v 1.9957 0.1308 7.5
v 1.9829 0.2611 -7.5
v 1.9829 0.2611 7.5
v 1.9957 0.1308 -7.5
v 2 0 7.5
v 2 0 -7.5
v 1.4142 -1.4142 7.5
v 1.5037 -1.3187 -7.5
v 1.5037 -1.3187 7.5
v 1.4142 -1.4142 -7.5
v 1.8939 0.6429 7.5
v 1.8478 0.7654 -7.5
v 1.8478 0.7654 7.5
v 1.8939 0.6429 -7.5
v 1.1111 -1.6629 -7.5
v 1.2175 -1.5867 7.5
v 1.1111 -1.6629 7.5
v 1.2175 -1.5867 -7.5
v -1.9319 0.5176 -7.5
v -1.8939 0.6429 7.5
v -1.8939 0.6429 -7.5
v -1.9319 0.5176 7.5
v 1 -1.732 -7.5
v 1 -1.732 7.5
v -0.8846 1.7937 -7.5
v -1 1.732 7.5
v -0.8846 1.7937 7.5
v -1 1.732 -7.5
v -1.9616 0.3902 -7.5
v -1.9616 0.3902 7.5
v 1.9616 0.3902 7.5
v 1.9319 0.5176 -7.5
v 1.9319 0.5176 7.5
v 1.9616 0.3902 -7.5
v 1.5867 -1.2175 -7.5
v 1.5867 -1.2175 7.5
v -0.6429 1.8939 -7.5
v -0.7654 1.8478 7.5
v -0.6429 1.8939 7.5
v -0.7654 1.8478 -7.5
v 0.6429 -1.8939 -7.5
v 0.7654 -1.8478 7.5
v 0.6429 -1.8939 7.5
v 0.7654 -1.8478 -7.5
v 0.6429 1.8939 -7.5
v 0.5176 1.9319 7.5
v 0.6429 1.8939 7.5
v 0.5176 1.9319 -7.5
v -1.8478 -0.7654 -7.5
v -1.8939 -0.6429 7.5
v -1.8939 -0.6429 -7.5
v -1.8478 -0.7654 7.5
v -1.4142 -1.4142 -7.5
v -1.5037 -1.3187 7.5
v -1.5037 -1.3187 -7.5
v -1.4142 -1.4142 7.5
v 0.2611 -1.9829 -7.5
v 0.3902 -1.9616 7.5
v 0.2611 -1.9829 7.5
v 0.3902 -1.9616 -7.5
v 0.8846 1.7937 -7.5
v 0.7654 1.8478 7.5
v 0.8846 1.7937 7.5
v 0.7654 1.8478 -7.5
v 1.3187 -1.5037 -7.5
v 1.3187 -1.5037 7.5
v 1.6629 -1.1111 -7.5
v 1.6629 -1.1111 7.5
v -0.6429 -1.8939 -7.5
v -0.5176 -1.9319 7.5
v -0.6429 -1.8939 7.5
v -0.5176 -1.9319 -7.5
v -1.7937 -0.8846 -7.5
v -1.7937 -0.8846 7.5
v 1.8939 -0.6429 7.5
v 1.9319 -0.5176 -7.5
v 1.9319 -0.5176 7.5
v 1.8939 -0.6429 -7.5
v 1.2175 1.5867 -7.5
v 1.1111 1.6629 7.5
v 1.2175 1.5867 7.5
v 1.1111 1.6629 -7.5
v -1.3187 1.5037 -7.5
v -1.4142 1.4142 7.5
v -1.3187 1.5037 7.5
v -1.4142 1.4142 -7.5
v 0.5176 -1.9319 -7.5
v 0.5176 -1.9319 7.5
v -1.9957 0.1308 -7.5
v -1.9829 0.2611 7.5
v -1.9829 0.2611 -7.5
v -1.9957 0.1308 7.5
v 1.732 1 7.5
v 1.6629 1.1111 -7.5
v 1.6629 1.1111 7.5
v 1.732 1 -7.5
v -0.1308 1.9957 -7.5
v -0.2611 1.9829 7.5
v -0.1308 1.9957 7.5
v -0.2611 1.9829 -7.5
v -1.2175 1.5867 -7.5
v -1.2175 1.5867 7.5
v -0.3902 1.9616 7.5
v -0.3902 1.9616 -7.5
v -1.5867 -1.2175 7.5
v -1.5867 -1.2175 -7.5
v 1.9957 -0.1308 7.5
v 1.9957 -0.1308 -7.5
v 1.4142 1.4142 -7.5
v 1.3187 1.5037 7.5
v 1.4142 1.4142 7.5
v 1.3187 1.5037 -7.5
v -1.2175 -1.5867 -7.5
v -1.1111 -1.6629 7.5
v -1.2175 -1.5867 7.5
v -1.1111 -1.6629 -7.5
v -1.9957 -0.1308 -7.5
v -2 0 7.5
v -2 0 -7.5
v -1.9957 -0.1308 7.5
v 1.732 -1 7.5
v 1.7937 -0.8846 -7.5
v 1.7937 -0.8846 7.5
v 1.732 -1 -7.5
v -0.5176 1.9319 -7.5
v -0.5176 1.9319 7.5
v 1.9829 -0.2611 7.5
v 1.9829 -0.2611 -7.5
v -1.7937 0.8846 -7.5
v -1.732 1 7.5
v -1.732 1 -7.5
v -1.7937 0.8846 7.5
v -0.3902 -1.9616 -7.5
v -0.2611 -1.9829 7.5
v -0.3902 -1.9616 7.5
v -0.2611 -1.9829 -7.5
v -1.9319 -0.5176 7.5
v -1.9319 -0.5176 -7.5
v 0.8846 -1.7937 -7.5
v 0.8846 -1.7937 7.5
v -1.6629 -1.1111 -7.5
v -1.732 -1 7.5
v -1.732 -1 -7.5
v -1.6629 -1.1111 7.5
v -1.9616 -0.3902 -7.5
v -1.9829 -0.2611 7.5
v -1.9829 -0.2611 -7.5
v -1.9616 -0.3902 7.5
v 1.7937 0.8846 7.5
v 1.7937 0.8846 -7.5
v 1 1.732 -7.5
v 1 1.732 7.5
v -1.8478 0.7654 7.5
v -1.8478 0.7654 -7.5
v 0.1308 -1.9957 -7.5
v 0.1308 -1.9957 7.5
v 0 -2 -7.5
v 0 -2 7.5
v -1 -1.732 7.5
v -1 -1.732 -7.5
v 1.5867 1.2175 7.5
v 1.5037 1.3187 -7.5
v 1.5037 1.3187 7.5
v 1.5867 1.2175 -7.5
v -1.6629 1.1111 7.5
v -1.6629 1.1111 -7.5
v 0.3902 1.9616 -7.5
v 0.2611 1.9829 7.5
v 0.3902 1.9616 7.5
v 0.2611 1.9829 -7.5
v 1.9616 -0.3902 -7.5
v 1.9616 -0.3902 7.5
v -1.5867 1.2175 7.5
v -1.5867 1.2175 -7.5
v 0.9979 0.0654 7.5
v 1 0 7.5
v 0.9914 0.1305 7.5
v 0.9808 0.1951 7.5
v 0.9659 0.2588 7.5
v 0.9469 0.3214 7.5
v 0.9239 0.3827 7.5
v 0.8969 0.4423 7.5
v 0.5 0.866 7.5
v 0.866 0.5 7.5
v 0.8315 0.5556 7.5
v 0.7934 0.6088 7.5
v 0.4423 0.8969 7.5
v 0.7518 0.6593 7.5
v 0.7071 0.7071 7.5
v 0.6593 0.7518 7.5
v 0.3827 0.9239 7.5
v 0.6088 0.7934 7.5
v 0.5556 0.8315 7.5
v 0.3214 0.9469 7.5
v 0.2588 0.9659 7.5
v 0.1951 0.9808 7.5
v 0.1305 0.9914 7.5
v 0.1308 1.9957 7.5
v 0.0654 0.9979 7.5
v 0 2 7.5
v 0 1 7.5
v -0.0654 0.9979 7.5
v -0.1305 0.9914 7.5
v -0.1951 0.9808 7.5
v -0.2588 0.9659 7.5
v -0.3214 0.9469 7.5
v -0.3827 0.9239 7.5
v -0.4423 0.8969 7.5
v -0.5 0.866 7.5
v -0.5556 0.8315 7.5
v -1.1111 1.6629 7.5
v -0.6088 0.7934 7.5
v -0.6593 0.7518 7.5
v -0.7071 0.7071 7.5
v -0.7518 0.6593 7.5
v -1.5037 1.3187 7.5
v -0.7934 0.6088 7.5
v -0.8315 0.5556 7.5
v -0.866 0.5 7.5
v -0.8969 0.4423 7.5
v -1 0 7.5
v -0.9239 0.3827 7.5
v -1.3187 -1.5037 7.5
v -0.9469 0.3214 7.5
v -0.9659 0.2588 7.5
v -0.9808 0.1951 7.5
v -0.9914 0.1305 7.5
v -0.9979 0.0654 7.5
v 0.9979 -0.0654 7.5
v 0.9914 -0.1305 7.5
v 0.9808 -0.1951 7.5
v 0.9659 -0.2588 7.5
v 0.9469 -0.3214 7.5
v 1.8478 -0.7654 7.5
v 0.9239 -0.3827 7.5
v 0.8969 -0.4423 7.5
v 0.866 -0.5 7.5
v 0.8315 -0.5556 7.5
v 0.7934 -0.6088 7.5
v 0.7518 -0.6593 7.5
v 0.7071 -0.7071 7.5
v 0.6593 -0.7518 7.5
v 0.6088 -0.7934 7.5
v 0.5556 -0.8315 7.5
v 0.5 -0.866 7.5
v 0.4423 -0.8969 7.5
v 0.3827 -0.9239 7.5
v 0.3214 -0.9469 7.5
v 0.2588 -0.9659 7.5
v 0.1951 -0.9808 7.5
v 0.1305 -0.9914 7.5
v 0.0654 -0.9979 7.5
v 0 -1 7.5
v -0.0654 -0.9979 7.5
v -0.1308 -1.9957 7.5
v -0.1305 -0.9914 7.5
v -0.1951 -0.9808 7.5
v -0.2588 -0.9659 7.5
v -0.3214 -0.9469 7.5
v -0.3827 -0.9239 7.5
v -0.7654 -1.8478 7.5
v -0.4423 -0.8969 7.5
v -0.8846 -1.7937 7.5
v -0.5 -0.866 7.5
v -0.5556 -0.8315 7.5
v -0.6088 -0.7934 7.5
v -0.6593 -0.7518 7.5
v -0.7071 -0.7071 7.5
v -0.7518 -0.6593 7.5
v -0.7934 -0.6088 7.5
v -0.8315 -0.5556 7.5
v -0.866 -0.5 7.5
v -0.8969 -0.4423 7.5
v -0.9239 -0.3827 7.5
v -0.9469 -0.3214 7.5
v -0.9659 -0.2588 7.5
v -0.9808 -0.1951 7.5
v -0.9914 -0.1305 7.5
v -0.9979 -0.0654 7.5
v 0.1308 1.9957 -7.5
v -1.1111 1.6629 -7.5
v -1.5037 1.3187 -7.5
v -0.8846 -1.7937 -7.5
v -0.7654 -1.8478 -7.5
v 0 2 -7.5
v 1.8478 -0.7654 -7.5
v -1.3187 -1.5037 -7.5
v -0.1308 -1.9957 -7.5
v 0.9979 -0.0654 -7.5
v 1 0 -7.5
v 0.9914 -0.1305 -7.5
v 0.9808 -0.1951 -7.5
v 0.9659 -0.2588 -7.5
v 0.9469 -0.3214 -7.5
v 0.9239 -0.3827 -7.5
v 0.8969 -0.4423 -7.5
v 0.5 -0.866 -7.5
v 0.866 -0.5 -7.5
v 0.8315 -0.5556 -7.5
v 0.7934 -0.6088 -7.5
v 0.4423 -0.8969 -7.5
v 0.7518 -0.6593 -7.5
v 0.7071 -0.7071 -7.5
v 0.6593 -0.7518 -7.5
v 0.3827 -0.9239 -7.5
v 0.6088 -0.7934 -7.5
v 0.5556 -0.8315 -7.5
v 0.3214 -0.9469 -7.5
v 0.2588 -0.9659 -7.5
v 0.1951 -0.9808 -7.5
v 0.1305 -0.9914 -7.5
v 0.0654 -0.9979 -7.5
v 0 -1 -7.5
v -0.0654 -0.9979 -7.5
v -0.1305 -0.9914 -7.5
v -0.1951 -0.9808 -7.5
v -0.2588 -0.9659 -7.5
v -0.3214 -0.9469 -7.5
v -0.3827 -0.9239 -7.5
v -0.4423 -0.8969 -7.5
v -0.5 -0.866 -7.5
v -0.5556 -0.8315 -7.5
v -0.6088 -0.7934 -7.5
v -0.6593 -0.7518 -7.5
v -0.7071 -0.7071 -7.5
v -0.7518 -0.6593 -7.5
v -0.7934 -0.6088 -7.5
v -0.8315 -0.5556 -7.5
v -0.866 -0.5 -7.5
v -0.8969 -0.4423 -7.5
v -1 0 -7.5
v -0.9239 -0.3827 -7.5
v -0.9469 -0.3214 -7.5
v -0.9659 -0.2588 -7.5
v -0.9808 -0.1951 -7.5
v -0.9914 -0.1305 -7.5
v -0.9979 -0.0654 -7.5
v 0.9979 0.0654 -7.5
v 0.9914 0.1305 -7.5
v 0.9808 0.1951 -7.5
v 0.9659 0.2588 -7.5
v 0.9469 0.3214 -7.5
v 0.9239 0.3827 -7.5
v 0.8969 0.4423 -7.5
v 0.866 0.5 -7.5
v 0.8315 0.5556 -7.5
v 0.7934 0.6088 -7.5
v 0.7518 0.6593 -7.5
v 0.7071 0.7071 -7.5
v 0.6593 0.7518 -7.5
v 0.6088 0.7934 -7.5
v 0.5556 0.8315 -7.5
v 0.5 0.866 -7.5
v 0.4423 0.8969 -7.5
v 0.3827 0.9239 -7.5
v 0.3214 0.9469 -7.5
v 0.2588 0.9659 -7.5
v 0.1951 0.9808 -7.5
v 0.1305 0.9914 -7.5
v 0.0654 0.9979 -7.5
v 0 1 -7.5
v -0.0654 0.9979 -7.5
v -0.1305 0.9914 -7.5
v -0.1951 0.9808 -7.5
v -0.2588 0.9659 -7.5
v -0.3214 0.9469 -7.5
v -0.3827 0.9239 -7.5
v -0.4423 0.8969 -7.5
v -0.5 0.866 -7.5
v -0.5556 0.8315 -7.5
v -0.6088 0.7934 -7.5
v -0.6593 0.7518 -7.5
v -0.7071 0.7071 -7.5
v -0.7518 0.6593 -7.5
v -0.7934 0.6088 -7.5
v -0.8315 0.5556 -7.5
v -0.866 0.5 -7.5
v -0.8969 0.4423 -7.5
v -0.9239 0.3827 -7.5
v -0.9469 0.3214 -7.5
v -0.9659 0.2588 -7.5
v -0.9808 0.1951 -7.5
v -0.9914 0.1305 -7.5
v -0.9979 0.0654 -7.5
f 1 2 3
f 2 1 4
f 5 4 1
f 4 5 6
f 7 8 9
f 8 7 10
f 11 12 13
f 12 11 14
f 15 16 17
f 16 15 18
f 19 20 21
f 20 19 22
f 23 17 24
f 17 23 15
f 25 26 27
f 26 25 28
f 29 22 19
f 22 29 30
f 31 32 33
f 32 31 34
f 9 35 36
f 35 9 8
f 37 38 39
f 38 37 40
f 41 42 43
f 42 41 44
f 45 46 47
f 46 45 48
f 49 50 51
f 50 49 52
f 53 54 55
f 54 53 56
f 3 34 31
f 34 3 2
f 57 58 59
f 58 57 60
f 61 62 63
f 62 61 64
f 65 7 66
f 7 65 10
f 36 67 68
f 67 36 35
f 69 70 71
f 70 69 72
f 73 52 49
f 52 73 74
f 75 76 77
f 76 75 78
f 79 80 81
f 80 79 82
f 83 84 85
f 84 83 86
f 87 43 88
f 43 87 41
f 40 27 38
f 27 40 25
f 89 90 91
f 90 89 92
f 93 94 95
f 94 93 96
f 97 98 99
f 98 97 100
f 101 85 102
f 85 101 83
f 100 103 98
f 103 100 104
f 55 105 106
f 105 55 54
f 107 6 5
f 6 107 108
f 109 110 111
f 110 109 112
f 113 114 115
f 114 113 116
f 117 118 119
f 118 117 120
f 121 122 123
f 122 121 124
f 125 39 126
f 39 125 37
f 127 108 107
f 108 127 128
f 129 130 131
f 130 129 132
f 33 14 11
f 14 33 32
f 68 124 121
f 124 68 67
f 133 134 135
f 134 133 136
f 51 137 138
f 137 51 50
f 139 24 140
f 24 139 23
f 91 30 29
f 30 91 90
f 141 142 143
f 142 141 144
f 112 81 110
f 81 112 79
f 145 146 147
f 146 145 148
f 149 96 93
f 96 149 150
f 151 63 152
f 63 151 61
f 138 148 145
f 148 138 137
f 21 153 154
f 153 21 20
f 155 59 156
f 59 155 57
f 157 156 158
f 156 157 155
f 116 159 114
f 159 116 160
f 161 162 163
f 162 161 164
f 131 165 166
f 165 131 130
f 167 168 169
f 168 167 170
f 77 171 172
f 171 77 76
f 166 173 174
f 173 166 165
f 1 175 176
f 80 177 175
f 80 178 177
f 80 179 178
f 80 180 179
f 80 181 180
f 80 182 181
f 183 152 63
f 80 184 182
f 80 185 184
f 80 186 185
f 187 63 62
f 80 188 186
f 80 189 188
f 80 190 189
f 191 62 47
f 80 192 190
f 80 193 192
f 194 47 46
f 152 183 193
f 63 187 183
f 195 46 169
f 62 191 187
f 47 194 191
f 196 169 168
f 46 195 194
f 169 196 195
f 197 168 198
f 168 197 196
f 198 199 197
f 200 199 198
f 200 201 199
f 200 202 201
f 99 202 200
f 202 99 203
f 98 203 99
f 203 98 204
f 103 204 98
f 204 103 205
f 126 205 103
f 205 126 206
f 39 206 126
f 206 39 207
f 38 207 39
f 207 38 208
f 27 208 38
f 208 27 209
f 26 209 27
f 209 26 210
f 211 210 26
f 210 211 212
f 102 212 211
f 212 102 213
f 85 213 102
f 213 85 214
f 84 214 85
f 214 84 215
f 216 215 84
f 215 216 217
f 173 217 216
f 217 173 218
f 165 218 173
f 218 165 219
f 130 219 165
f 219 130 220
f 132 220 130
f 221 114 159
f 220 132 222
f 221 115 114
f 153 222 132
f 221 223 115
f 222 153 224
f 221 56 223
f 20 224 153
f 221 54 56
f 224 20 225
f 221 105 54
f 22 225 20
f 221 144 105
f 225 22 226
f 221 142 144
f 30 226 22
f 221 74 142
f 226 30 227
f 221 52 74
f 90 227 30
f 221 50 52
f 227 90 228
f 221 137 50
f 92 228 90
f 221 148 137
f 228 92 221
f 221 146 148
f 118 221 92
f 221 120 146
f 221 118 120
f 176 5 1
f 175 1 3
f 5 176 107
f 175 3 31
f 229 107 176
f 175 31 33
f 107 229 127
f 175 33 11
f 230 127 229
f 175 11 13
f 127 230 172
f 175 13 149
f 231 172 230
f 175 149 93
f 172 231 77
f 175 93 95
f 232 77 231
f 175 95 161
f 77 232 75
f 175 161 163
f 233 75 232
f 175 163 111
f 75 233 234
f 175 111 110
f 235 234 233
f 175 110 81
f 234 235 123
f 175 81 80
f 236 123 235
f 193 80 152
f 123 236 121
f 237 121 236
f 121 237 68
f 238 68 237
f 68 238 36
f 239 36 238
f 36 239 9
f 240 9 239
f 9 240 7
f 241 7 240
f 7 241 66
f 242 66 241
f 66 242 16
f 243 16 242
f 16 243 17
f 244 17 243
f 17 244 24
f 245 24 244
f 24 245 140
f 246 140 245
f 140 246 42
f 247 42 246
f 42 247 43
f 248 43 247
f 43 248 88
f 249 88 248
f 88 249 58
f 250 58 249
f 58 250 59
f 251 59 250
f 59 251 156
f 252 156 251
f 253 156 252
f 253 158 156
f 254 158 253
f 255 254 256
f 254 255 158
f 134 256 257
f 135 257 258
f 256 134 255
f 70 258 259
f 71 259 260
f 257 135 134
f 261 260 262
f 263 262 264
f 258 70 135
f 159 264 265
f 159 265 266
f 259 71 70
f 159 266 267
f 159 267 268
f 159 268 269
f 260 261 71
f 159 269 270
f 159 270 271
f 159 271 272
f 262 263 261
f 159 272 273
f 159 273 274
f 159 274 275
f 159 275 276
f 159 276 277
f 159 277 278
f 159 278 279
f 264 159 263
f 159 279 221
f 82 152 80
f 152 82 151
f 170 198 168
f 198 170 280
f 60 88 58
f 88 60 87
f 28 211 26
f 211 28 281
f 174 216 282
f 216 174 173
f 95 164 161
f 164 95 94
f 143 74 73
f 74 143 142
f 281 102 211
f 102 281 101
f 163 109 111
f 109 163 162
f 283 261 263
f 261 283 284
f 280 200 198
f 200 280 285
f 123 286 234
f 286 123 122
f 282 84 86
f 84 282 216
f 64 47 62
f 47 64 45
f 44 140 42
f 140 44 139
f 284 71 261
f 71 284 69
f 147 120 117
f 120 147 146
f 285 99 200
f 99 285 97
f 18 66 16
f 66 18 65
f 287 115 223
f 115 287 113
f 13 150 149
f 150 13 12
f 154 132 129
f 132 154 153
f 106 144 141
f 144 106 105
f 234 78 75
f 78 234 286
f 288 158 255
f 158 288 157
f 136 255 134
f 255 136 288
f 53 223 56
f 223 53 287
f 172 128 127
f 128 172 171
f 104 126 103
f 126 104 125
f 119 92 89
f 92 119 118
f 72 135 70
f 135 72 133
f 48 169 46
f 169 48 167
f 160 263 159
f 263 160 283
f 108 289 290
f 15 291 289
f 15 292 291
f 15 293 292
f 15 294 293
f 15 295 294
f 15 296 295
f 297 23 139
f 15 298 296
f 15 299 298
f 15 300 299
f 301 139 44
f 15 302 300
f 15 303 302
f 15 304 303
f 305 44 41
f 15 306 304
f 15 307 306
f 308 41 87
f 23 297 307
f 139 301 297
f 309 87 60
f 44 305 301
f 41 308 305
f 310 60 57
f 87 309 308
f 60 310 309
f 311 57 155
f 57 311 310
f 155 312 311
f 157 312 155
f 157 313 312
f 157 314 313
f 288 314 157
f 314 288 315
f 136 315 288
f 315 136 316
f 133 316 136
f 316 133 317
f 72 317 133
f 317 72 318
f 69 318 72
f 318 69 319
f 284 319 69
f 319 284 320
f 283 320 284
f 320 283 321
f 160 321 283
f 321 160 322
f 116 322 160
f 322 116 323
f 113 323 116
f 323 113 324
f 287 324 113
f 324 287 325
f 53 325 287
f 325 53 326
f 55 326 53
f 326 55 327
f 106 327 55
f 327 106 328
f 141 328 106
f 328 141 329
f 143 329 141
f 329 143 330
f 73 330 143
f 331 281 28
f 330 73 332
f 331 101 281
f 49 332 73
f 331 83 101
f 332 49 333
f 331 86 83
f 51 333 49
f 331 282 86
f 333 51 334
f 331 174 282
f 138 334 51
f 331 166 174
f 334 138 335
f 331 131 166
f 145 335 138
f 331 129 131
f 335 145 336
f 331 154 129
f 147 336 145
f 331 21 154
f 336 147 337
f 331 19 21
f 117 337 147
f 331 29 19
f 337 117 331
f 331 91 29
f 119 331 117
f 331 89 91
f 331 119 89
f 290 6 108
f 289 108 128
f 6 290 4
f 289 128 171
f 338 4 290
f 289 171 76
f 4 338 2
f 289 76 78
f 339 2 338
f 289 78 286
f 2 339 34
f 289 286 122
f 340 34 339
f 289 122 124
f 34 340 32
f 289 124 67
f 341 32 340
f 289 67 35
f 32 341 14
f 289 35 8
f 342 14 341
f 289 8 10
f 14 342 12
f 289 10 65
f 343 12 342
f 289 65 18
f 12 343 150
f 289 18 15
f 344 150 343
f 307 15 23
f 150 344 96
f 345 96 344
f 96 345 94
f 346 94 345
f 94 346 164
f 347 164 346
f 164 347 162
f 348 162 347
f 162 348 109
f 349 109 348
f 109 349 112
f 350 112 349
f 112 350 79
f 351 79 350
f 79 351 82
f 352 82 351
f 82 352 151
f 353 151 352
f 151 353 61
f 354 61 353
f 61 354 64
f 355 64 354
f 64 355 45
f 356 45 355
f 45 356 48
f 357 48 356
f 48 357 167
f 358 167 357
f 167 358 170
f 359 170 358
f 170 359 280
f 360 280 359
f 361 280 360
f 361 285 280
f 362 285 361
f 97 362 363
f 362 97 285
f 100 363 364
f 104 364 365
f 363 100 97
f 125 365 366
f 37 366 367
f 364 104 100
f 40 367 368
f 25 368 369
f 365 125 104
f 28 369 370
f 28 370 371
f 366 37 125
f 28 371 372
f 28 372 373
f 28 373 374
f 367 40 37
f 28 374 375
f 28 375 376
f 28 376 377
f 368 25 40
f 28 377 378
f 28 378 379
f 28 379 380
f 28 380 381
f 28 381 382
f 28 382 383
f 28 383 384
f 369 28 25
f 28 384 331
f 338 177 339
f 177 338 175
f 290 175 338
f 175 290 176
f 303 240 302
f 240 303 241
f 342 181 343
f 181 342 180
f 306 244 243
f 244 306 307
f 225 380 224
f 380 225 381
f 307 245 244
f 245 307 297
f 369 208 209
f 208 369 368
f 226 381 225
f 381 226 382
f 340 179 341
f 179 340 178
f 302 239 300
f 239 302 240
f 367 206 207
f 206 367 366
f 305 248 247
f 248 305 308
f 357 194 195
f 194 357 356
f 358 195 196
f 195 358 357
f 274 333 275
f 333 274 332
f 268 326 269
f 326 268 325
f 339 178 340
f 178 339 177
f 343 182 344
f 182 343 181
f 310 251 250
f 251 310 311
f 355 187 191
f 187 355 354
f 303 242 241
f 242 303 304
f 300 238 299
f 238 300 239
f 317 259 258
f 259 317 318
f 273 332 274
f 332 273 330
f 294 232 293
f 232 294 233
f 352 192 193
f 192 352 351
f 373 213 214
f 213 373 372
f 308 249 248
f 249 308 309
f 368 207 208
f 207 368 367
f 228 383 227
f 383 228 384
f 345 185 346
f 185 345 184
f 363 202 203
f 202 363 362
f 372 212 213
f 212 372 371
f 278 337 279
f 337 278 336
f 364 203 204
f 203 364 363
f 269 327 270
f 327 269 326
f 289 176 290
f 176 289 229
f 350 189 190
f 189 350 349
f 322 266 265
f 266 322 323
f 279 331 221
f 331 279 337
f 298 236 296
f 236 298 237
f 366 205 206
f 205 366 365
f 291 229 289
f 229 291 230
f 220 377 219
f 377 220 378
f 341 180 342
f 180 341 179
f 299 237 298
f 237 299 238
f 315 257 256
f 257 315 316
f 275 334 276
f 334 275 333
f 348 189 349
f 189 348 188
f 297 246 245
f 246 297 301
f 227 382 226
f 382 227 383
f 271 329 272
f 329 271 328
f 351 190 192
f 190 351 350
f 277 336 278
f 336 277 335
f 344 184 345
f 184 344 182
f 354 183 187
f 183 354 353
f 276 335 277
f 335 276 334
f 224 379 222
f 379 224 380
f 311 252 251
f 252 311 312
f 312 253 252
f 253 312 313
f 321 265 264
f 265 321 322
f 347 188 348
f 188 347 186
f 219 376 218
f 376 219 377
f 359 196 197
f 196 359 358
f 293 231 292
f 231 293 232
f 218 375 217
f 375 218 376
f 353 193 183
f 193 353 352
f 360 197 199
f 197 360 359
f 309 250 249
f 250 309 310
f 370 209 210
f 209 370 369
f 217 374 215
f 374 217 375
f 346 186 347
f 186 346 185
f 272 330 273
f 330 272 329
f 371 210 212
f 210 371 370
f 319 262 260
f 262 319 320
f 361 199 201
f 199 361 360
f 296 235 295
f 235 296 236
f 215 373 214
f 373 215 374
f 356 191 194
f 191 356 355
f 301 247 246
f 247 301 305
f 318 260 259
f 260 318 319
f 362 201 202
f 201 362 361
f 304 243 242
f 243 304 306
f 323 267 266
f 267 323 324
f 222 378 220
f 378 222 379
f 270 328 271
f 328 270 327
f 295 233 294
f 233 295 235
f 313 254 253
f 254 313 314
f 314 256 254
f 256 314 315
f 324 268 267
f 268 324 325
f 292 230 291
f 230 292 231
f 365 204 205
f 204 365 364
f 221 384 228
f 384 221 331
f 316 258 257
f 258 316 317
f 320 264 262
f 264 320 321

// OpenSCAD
// Parameters
length = 15; //[7.5:30:0.5]
outer_diameter = 4; //[2:8:0.1]
inner_diameter = 2; //[1:6:0.1]
forced_id = 0; //[0:10:0.1]
center = 1; //[0:1:1]
eps = 0.8; //[0.2:2:0.1]

$fn = 96;

// Tubing - PTFE sleeving (hollow cylinder)
module tubing() {
  od = max(outer_diameter, 0.01);
  id_req = (forced_id > 0) ? forced_id : inner_diameter;

  // Ensure a printable/visible wall thickness and valid difference
  min_wall = 0.2;
  id = min(max(id_req, 0), max(0, od - 2*min_wall));

  // Avoid degenerate height
  h = max(length, 0.01);

  color([0.85, 0.85, 0.8])
  difference() {
    cylinder(h=h, r=od/2, center=true);
    cylinder(h=h + 2*eps, r=id/2, center=true);
  }
}

// Assembly
module assembly() {
  // center=1 -> centered at origin; center=0 -> bottom at z=0
  translate([0, 0, (1-center) * (length/2)]) tubing();
}

assembly();
